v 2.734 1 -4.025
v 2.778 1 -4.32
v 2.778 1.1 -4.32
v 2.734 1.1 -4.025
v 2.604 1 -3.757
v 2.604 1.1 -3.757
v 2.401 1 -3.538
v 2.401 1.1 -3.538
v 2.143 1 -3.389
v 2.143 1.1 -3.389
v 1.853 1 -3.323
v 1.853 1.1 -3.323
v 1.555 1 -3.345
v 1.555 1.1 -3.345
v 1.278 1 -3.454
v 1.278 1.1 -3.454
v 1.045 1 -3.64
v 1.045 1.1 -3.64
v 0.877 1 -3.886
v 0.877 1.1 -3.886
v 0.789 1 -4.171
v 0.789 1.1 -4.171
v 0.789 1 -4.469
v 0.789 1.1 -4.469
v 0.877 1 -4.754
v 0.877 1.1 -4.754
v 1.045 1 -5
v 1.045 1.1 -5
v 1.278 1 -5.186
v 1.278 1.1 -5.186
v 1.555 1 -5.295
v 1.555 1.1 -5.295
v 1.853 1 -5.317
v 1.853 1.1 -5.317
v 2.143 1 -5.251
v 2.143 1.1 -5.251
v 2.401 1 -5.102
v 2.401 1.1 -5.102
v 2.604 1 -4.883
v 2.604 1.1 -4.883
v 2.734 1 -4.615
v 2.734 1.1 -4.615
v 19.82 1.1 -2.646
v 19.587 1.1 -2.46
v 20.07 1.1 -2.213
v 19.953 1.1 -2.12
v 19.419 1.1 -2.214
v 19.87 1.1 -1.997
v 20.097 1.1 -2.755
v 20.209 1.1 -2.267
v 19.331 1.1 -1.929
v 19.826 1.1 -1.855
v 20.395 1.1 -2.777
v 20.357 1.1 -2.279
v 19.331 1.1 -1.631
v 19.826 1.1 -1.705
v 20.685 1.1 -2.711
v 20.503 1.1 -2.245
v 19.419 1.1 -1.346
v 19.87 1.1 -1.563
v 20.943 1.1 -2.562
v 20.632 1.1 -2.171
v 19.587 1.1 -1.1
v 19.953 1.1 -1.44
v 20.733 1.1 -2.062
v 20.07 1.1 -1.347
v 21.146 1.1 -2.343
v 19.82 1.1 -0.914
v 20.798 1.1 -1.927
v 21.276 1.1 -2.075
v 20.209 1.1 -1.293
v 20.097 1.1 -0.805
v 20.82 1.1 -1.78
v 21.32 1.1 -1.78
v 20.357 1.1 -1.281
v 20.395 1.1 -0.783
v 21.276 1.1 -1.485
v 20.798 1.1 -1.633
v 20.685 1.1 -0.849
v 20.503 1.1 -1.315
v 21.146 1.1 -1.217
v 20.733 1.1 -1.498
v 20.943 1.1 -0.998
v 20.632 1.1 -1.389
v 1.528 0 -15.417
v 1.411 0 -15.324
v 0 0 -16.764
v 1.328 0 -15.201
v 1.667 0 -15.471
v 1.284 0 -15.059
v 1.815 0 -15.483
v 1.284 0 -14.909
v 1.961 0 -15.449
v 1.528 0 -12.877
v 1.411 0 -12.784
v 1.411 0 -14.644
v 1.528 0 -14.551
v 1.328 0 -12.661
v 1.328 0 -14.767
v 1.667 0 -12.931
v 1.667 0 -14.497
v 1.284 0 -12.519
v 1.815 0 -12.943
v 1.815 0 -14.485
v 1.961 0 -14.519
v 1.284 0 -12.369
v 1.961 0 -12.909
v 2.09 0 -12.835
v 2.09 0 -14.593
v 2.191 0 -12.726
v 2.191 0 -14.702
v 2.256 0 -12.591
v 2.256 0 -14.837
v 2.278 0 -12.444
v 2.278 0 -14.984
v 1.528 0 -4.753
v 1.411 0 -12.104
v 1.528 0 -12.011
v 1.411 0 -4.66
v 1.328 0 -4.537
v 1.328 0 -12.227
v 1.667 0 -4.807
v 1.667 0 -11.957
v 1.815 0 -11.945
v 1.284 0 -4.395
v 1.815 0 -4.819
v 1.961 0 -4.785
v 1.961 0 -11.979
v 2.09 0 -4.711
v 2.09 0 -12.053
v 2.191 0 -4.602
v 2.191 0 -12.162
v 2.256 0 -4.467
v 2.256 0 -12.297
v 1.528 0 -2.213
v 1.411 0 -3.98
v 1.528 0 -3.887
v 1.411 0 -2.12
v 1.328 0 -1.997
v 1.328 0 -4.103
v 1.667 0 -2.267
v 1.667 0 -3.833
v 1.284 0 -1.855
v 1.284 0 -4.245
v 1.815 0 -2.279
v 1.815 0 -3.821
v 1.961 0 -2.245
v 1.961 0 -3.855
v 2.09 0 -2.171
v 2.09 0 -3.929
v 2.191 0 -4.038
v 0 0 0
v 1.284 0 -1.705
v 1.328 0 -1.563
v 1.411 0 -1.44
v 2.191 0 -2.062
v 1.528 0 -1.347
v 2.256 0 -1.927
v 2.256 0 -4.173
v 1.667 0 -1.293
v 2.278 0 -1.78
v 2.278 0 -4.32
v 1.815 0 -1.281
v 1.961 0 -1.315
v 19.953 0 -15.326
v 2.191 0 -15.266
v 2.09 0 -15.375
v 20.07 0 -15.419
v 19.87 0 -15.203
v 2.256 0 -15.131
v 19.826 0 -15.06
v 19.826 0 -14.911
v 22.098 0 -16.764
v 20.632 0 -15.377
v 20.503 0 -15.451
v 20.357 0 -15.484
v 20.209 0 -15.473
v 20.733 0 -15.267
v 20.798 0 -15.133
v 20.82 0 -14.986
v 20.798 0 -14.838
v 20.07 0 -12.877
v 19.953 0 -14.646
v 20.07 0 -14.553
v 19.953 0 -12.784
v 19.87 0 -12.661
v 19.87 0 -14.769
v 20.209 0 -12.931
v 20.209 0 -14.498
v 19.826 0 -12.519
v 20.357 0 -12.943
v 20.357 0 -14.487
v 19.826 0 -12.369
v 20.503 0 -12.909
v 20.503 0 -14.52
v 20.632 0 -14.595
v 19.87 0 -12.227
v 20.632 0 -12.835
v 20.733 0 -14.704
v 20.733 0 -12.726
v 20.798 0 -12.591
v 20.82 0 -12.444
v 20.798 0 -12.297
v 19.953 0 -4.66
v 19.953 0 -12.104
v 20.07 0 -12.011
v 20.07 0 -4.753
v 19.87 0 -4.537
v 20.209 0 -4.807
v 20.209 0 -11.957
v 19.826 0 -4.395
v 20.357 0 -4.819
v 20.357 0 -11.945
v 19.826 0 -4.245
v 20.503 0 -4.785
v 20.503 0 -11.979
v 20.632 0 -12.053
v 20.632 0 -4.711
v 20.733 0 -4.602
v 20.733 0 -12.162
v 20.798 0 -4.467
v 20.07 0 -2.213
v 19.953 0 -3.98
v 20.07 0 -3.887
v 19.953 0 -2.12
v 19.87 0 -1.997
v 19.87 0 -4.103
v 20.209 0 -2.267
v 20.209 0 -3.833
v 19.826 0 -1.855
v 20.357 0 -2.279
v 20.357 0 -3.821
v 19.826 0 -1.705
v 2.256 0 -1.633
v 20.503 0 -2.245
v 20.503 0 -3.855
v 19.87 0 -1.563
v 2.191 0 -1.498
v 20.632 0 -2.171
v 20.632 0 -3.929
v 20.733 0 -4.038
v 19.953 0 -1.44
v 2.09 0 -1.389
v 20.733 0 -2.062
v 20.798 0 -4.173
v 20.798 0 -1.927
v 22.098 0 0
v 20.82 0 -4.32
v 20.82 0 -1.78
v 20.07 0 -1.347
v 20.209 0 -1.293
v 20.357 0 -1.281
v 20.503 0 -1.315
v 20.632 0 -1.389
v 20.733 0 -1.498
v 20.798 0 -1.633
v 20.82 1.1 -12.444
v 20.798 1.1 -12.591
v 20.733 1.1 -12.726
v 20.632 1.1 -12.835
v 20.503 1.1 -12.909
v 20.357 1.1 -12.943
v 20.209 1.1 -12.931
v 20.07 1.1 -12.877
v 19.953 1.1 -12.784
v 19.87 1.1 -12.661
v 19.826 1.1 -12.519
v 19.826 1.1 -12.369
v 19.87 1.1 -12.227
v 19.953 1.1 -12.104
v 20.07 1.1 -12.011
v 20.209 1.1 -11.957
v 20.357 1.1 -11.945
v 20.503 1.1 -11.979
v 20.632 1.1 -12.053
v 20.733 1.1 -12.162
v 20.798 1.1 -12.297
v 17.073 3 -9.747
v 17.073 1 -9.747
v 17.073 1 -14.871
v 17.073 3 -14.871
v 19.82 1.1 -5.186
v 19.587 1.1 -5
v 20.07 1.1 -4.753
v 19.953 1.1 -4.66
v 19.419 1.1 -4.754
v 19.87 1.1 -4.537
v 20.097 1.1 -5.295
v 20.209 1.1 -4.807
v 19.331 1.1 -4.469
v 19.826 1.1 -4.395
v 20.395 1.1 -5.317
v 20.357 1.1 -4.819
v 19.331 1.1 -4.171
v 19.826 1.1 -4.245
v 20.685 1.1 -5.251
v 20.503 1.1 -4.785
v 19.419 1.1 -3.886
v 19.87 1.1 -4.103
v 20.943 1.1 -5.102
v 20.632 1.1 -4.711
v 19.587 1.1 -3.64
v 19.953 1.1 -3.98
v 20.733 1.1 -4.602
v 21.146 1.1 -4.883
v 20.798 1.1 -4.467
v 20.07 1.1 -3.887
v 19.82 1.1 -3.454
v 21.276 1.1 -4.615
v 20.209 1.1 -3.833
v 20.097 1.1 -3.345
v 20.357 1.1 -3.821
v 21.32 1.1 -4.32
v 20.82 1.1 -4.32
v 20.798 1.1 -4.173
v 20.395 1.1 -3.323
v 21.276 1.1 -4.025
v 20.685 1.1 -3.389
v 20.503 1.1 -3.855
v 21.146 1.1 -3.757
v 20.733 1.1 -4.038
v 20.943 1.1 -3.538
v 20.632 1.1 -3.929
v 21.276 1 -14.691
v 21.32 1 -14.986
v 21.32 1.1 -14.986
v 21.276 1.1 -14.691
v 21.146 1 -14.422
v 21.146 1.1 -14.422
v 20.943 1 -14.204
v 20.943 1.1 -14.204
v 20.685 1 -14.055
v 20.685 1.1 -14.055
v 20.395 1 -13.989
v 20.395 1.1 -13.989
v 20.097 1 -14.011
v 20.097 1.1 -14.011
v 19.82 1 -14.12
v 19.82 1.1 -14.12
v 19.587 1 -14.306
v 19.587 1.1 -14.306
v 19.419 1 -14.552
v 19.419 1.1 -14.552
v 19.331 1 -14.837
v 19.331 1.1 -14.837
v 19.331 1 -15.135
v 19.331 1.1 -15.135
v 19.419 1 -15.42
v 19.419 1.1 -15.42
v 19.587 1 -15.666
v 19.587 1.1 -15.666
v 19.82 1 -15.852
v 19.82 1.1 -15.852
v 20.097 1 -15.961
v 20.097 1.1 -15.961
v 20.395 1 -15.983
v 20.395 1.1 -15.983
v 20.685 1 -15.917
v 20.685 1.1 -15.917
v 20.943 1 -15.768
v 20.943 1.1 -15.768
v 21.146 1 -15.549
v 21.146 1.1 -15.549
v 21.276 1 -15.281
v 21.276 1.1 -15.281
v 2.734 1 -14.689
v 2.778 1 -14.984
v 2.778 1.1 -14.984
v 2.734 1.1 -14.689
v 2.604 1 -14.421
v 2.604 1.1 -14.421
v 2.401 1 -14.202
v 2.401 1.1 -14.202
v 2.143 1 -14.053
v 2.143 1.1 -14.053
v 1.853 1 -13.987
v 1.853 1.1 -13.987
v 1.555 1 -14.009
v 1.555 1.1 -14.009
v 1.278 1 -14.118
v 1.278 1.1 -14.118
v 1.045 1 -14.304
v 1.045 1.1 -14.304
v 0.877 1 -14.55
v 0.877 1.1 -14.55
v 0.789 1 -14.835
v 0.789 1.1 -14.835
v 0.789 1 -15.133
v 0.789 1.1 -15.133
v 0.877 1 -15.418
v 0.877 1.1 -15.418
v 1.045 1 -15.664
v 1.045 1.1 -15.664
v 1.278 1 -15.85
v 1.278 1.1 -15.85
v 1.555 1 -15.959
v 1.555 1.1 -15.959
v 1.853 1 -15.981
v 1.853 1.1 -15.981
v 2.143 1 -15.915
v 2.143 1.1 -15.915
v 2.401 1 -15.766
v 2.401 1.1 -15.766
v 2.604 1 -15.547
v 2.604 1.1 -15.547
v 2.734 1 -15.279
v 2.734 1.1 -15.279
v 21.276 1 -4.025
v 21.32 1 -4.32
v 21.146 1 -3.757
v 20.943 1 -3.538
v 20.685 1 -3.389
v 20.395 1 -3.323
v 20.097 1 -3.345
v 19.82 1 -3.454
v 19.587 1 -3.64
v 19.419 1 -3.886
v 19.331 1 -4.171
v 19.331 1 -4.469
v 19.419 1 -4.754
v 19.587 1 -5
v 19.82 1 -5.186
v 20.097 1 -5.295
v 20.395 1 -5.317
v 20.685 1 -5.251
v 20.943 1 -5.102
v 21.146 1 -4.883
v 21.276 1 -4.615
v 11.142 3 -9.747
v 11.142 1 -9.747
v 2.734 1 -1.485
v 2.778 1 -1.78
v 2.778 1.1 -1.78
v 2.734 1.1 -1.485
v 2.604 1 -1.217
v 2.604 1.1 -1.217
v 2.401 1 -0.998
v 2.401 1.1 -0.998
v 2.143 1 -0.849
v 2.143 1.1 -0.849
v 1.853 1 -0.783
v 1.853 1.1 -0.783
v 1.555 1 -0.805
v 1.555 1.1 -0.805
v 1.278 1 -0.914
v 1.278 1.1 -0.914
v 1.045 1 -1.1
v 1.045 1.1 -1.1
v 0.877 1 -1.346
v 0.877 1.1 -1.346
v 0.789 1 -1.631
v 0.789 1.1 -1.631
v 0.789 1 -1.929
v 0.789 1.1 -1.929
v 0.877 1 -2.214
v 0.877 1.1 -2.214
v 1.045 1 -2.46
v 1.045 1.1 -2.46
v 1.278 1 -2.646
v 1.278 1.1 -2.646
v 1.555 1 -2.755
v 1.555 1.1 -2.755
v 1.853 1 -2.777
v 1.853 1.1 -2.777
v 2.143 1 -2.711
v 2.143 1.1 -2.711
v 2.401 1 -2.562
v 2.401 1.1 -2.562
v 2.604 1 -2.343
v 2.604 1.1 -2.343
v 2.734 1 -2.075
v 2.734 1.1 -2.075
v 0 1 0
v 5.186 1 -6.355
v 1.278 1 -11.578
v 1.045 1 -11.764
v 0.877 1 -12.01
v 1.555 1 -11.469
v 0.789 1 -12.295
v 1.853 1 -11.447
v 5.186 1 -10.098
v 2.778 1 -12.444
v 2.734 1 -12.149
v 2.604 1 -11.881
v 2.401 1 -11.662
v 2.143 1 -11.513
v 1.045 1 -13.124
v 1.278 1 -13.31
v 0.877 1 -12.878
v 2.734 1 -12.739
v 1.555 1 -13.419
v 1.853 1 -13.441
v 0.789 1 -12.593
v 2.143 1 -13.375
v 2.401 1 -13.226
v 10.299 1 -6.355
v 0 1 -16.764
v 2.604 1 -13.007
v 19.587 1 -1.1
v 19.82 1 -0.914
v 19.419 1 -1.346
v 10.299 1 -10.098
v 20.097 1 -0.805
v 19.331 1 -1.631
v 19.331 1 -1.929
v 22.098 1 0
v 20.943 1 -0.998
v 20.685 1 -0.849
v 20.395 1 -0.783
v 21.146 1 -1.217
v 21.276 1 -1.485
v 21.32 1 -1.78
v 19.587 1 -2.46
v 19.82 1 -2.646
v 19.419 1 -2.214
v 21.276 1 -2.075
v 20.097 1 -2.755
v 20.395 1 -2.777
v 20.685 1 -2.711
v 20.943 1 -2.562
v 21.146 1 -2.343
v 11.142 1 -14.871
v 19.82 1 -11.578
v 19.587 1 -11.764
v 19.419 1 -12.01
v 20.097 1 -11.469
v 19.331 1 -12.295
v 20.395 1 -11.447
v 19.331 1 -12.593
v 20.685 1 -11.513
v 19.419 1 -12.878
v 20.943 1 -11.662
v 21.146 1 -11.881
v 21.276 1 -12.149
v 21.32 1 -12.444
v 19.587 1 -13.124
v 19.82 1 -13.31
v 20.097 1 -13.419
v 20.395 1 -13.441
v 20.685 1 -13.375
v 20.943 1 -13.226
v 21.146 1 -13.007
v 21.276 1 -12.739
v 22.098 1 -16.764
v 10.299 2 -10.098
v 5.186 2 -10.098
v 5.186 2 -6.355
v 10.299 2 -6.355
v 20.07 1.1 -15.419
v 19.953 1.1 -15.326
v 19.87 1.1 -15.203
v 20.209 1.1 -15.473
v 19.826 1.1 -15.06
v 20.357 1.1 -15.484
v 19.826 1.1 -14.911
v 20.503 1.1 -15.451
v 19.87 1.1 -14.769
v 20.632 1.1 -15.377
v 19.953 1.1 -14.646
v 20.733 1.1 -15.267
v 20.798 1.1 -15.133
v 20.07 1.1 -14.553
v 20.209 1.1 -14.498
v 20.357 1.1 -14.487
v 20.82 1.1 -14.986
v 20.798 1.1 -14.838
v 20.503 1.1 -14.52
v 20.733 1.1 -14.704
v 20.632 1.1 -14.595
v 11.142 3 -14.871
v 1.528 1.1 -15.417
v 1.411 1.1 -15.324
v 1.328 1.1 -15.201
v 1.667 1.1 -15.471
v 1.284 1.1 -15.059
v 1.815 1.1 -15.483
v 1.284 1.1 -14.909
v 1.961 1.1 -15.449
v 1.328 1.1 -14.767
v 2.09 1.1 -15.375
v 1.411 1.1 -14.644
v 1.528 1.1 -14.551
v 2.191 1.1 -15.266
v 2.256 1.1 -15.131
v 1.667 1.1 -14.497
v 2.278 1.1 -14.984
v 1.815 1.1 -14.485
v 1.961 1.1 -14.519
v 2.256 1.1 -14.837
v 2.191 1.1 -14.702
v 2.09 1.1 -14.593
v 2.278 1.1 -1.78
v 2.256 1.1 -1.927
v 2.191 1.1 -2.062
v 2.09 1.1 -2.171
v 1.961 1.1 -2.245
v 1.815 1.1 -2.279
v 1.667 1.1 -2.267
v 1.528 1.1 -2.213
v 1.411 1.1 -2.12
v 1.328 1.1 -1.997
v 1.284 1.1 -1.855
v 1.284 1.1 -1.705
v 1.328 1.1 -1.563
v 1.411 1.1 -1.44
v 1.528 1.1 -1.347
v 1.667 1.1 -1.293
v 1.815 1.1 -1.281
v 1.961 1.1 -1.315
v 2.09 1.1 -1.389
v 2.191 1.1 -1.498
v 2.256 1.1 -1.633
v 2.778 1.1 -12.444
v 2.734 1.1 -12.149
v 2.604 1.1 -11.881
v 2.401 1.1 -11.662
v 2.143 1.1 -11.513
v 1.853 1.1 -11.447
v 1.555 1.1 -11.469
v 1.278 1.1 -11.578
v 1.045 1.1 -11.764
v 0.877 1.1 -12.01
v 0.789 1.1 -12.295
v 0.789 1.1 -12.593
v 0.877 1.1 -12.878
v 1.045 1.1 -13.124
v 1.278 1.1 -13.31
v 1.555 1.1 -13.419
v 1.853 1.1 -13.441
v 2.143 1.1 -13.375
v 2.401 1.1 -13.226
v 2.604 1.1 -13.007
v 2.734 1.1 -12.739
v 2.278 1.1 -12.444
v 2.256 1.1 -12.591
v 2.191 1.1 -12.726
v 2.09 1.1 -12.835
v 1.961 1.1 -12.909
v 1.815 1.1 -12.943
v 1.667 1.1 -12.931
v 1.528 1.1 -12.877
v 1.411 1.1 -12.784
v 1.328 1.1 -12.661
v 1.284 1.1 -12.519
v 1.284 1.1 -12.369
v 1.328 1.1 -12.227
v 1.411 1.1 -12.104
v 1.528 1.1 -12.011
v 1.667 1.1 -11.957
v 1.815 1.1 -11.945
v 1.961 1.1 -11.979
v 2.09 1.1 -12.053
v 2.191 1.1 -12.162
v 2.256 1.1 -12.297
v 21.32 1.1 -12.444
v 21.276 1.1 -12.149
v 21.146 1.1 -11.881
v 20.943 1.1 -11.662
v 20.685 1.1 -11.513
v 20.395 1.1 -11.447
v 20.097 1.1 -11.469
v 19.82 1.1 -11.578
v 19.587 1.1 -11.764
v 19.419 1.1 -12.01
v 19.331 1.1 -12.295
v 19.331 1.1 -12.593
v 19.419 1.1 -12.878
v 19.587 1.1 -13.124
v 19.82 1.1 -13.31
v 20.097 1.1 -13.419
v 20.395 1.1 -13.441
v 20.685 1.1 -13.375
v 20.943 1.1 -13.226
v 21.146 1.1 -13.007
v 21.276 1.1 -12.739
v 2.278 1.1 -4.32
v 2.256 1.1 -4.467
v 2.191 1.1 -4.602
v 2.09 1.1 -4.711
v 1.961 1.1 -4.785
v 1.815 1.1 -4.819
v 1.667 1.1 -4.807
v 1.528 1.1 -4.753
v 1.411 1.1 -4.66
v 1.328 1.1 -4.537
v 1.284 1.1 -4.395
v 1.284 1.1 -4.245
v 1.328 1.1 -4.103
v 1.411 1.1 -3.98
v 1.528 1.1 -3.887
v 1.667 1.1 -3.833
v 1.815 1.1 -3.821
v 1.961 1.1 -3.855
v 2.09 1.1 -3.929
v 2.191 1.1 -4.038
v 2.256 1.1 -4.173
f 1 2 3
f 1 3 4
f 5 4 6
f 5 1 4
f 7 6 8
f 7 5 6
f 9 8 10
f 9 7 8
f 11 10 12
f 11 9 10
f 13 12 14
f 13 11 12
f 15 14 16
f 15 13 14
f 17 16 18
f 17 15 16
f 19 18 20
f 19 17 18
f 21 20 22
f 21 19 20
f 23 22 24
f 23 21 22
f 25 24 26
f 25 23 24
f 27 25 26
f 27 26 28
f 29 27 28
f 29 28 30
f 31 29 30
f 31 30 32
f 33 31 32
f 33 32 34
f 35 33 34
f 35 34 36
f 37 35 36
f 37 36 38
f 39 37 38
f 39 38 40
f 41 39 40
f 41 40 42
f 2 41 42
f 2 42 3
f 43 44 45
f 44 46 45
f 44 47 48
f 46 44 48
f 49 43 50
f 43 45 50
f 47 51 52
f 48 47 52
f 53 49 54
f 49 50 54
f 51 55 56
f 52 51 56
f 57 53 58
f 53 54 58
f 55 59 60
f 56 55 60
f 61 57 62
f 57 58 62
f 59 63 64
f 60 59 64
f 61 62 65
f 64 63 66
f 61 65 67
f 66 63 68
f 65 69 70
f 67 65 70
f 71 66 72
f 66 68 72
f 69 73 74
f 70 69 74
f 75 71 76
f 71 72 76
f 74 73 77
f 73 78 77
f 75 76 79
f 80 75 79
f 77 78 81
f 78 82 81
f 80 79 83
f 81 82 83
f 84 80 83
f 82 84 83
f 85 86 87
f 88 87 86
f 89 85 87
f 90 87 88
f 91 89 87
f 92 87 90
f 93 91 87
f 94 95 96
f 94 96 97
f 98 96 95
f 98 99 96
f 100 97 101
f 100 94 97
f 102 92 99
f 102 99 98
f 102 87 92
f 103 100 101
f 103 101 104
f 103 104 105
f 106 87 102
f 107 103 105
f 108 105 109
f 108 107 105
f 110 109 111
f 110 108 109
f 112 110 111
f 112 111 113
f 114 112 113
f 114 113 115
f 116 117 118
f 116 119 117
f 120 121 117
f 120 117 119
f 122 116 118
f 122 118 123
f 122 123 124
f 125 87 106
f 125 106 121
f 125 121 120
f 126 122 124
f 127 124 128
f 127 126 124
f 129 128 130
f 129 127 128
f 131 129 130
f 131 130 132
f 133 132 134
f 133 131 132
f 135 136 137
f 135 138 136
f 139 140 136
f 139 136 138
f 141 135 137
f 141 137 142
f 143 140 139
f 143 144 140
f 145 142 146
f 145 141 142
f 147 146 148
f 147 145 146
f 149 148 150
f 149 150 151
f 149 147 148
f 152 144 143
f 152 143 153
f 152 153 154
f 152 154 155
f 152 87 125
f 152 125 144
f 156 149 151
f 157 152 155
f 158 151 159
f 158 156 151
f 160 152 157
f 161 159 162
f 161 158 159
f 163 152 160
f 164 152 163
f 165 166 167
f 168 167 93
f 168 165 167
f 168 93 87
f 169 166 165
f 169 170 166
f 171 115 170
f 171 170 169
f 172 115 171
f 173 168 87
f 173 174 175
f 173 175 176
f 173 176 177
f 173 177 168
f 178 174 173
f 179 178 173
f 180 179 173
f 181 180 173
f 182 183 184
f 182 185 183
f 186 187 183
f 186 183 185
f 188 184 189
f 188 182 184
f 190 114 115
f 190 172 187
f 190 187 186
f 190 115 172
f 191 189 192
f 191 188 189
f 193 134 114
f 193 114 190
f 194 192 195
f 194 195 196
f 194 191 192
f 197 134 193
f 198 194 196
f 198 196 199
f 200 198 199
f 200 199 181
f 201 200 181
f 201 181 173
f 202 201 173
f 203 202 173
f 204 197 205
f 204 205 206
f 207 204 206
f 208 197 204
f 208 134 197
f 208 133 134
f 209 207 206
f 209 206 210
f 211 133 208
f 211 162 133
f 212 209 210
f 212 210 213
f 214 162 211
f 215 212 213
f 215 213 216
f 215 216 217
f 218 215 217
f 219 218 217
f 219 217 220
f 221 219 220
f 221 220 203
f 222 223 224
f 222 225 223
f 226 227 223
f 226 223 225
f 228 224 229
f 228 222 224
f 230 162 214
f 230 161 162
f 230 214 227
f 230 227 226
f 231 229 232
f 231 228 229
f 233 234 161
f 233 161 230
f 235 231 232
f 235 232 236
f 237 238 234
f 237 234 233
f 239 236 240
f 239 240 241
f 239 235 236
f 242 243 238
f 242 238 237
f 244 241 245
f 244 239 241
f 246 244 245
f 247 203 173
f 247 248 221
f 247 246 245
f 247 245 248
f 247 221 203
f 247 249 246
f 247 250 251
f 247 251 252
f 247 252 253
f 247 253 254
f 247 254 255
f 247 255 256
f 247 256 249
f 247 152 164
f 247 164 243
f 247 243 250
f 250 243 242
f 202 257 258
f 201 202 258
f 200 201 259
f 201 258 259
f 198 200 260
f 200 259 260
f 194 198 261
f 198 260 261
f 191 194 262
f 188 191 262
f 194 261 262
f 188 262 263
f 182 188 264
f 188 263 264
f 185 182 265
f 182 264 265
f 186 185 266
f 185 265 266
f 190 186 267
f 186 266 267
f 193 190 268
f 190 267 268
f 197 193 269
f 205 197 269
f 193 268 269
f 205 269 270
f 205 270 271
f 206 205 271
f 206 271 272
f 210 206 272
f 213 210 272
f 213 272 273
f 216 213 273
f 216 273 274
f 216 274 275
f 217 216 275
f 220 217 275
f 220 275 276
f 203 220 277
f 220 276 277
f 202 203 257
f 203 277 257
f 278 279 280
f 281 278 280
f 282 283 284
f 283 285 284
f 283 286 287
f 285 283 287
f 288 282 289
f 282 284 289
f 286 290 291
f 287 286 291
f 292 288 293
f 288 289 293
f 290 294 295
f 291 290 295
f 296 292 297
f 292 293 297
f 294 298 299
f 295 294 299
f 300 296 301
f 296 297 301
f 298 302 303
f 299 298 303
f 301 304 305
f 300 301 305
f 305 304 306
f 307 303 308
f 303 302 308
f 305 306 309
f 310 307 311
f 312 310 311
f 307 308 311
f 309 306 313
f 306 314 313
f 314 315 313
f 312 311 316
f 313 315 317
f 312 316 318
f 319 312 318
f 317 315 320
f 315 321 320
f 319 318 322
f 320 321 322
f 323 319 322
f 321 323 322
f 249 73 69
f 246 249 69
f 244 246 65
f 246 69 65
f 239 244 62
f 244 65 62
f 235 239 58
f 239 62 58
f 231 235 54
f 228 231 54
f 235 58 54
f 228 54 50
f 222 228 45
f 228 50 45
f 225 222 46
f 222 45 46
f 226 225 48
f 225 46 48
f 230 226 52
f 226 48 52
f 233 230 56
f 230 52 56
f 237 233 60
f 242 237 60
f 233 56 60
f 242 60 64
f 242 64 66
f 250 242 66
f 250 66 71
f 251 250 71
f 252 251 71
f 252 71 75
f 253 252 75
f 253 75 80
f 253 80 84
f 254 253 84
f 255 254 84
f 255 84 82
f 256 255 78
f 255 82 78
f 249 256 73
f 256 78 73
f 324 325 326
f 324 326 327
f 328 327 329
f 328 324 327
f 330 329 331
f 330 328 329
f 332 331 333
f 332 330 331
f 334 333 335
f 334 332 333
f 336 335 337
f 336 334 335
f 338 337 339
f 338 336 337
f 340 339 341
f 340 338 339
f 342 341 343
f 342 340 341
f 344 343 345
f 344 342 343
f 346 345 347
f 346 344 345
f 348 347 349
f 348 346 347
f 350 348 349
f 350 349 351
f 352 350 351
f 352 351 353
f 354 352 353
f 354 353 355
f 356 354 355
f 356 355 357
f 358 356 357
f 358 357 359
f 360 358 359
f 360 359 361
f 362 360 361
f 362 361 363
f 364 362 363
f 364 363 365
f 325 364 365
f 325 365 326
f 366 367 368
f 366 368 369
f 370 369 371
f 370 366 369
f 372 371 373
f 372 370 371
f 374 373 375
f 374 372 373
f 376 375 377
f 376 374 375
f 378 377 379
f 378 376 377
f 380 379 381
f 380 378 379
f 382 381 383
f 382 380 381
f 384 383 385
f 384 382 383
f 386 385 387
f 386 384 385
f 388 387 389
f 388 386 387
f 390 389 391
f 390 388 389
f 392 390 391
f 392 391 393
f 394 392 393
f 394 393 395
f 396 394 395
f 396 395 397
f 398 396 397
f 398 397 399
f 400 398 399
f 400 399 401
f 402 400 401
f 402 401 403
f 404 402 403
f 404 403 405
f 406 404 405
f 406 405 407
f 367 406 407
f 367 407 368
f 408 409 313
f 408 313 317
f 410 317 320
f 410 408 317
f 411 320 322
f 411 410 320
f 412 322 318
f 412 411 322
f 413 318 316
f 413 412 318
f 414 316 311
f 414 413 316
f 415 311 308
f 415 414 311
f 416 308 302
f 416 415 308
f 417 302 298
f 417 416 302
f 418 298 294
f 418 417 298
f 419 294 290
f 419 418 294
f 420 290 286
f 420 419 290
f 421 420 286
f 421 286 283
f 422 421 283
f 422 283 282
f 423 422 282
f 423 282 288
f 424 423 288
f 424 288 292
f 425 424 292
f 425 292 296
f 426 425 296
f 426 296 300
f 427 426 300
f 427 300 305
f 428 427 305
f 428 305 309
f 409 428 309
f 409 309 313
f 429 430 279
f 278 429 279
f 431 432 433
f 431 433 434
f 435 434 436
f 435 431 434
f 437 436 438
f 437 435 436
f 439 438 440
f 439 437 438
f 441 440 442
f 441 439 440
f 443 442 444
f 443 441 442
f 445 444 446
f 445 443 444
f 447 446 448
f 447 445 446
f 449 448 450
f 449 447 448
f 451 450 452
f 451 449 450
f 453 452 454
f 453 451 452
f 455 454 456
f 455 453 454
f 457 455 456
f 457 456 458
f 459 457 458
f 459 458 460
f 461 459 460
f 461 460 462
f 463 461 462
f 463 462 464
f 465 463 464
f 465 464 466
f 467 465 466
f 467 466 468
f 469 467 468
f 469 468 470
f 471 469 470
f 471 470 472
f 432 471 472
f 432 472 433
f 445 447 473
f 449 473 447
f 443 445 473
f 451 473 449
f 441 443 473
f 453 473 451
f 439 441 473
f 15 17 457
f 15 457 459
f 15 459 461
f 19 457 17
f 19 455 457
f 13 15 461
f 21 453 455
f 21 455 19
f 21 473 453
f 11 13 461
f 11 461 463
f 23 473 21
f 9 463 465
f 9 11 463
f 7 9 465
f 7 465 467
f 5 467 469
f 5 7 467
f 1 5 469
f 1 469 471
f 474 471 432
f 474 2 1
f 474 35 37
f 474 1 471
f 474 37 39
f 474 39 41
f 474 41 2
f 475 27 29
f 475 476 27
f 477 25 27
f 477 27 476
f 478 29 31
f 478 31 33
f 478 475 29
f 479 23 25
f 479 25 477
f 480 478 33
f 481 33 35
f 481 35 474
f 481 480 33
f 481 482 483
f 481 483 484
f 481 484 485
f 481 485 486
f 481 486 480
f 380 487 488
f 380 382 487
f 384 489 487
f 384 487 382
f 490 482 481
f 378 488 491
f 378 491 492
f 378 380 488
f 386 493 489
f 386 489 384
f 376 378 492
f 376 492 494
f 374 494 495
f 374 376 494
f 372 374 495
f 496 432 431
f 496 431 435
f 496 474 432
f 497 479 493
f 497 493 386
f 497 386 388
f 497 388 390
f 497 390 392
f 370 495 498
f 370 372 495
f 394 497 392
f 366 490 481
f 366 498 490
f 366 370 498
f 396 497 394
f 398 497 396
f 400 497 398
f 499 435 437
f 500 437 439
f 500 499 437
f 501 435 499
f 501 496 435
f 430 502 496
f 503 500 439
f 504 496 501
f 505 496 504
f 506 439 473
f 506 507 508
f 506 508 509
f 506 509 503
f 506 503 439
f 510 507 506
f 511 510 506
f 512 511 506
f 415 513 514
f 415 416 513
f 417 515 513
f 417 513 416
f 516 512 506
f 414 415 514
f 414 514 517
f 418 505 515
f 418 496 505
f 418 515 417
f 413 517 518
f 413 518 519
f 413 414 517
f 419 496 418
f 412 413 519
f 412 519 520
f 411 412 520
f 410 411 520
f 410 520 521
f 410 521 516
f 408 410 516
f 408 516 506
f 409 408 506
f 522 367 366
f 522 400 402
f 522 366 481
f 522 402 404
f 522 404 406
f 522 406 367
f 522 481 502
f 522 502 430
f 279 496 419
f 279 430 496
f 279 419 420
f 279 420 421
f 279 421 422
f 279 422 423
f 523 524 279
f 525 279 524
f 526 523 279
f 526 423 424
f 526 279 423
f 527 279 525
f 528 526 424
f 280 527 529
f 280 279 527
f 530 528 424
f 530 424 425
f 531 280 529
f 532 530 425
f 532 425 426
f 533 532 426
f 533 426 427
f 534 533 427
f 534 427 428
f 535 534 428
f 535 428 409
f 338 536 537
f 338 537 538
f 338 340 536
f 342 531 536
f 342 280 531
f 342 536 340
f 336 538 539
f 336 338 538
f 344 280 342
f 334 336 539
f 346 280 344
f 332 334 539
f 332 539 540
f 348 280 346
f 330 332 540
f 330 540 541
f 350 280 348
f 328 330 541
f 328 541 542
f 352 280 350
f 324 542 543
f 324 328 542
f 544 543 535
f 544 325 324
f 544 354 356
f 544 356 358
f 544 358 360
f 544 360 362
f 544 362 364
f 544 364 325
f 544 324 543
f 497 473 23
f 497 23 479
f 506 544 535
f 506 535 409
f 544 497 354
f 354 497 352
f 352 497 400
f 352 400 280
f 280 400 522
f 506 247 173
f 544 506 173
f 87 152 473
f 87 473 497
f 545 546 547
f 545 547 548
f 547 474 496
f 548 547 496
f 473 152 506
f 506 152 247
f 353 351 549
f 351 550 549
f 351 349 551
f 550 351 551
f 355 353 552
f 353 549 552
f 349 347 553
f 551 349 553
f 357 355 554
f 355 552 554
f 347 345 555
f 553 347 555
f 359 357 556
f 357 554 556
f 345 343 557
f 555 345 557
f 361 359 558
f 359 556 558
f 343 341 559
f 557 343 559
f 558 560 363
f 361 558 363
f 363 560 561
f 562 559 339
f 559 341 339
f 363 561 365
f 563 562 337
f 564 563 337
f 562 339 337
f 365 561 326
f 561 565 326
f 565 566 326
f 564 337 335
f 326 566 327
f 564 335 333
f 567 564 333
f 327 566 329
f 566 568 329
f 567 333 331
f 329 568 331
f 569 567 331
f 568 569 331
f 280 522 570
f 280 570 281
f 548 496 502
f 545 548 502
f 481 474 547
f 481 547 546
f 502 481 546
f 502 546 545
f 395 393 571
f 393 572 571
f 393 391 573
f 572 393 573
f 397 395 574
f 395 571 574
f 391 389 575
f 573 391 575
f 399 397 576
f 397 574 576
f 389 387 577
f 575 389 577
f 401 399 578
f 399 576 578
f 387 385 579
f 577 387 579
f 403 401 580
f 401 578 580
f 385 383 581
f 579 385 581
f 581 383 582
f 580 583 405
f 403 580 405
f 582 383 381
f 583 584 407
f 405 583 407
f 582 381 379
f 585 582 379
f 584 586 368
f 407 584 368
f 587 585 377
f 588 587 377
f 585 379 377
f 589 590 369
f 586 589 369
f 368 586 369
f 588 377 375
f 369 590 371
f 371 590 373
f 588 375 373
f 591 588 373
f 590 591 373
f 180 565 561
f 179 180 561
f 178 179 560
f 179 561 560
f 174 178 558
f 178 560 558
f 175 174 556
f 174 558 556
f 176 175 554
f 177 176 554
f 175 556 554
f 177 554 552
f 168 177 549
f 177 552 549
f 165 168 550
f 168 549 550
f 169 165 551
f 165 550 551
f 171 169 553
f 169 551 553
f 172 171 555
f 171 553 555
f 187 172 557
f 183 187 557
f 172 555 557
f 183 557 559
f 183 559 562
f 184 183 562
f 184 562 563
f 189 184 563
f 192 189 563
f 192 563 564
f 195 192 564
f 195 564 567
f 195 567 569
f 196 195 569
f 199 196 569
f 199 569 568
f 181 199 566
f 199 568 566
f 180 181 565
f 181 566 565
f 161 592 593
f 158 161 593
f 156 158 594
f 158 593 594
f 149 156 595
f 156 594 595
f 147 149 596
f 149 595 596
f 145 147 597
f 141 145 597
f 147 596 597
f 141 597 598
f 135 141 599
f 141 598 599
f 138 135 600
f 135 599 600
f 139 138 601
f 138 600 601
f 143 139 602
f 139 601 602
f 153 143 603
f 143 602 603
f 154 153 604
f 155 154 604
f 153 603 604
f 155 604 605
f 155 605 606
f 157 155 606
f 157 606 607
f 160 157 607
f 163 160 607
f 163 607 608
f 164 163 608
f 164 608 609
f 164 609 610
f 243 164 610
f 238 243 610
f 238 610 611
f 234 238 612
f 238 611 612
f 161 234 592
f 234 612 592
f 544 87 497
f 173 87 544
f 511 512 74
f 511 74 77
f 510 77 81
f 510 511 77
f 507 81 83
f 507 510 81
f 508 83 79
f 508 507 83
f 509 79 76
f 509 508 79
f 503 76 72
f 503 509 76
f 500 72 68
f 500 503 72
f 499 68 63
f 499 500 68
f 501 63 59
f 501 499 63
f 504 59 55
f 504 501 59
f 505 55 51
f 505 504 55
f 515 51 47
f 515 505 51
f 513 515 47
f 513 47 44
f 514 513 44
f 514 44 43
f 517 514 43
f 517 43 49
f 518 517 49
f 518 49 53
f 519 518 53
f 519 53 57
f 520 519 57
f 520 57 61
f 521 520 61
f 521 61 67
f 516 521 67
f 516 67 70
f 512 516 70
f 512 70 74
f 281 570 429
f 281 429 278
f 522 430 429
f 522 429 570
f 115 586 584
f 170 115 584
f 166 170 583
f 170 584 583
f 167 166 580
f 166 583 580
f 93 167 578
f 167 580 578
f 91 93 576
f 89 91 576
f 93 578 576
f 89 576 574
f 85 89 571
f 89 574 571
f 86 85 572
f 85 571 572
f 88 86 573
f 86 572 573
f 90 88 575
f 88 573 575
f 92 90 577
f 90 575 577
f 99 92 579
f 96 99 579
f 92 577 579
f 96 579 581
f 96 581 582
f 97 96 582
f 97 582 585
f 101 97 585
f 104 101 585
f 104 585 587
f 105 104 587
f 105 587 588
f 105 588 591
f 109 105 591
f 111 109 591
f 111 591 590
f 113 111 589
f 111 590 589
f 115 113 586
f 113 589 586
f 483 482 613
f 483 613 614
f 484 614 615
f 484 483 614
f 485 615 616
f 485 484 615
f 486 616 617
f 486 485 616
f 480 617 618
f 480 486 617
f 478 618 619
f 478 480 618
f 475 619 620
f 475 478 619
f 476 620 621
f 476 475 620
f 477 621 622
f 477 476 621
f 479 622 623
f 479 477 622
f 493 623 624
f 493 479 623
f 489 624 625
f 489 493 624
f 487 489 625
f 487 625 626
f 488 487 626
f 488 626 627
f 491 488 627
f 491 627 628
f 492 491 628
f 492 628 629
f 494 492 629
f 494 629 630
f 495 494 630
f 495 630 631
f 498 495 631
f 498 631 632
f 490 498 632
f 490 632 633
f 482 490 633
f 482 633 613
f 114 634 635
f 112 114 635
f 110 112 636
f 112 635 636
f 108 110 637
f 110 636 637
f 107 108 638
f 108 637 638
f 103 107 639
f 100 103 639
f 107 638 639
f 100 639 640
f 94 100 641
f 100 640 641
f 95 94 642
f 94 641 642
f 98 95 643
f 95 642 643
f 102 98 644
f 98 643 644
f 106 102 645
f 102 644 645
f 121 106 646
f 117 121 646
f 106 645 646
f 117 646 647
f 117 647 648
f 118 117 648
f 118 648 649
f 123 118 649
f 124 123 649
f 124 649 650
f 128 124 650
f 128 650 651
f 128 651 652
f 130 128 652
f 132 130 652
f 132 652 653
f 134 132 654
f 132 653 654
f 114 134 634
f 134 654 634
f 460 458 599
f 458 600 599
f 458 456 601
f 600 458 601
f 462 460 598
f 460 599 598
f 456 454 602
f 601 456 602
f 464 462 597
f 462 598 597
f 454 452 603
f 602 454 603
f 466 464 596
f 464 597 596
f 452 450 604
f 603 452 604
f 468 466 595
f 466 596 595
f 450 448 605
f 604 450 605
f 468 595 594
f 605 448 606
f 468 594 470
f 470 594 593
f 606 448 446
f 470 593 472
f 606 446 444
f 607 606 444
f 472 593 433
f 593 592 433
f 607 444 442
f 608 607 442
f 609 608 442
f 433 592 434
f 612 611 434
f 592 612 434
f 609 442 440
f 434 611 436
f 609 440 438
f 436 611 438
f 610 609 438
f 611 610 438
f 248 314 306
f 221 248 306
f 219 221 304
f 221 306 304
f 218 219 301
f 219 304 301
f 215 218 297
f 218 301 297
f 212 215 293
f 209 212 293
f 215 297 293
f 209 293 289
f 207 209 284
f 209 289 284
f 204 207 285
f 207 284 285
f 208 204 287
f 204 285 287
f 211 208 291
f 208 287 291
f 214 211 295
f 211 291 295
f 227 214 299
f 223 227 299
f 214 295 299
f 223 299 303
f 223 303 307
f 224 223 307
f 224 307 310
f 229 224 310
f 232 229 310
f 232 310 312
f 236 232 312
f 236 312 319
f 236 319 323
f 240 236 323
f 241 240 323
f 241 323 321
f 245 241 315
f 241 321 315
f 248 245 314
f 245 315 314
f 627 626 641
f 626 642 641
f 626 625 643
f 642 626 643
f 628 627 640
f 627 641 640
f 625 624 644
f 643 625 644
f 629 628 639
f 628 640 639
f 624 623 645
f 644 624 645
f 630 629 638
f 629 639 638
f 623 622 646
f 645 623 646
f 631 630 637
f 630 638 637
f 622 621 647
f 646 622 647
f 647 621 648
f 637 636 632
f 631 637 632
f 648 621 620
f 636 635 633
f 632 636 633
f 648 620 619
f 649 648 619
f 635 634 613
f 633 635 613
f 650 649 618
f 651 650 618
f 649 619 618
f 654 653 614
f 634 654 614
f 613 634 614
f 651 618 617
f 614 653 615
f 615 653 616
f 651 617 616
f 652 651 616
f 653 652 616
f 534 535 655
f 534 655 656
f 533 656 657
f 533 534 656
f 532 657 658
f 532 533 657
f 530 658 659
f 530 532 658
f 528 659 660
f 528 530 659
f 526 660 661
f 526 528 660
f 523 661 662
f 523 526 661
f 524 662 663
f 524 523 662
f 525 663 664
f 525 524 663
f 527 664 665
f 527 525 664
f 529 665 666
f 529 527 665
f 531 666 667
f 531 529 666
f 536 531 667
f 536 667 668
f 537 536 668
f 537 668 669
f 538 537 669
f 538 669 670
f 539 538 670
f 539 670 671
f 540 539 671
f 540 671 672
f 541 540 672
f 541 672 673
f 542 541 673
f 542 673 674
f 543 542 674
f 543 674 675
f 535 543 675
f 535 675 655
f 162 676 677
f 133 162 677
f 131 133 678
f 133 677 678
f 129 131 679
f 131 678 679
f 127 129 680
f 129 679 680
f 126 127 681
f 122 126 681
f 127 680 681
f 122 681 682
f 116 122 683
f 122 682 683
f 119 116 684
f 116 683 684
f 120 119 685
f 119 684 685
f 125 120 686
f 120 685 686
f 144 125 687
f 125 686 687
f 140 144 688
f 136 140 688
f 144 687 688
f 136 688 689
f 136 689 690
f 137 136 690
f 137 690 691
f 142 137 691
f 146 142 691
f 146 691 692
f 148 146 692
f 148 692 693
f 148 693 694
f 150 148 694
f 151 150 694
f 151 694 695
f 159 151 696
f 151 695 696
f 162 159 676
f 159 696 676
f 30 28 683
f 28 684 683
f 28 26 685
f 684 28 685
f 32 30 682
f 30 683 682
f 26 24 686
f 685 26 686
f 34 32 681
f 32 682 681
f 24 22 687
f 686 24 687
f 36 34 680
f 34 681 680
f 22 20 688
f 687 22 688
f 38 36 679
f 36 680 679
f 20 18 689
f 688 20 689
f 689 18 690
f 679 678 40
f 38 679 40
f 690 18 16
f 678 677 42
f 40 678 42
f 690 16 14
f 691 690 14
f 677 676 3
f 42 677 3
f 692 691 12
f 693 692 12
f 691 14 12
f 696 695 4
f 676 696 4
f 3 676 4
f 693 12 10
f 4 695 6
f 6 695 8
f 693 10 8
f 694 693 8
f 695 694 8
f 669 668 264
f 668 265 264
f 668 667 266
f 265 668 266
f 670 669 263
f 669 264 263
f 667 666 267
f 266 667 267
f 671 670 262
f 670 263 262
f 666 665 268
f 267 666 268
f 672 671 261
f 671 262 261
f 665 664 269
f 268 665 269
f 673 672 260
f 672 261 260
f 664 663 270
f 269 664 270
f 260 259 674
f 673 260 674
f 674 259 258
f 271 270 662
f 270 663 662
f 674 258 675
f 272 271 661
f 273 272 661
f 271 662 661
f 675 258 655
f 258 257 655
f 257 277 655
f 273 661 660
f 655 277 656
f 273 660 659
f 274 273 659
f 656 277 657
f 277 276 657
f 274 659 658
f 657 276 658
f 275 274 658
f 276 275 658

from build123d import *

# Parameters (mm, degrees)
SKETCH1_W           = 22.098
SKETCH1_H           = 16.764
BOSS_EXTRUDE1_DEPTH = 1
SKETCH2_R           = 1
BOSS_EXTRUDE2_DEPTH = 1.1
SKETCH4_R           = 0.5
CUT_EXTRUDE1_DEPTH  = 1.1
SKETCH5_W           = 5.931061502
SKETCH5_H           = 5.124055134
BOSS_EXTRUDE3_DEPTH = 2
SKETCH6_W           = 5.112840458
SKETCH6_H           = 3.742927716
BOSS_EXTRUDE4_DEPTH = 1


with BuildPart() as part:
    # Sketch1 → Boss-Extrude1 (new body)
    with BuildSketch(Plane(origin=(0, 0, 0), x_dir=(1, 0, 0), z_dir=(0, 1, 0))):
        with Locations((11.049, 8.382)):
            Rectangle(SKETCH1_W, SKETCH1_H)
    extrude(amount=BOSS_EXTRUDE1_DEPTH)

    # Sketch2 → Boss-Extrude2 (add)
    with BuildSketch(Plane.XZ):
        with Locations((1.778, -14.984)):
            Circle(SKETCH2_R)
        with Locations((20.32, -14.985792546)):
            Circle(SKETCH2_R)
        with Locations((1.778, -12.444)):
            Circle(SKETCH2_R)
        with Locations((20.32, -12.444)):
            Circle(SKETCH2_R)
        with Locations((1.778, -1.78)):
            Circle(SKETCH2_R)
        with Locations((1.778, -4.32)):
            Circle(SKETCH2_R)
        with Locations((20.32, -4.32)):
            Circle(SKETCH2_R)
        with Locations((20.32, -1.78)):
            Circle(SKETCH2_R)
    extrude(amount=-BOSS_EXTRUDE2_DEPTH)

    # Sketch4 → Cut-Extrude1 (cut)
    with BuildSketch(Plane(origin=(0, 1.1, 0), x_dir=(1, 0, 0), z_dir=(0, 1, 0))):
        with Locations((1.778, 14.984)):
            Circle(SKETCH4_R)
        with Locations((1.778, 12.444)):
            Circle(SKETCH4_R)
        with Locations((1.778, 4.32)):
            Circle(SKETCH4_R)
        with Locations((1.778, 1.78)):
            Circle(SKETCH4_R)
        with Locations((20.32, 14.985792546)):
            Circle(SKETCH4_R)
        with Locations((20.32, 12.444)):
            Circle(SKETCH4_R)
        with Locations((20.32, 4.32)):
            Circle(SKETCH4_R)
        with Locations((20.32, 1.78)):
            Circle(SKETCH4_R)
    extrude(amount=-CUT_EXTRUDE1_DEPTH, mode=Mode.SUBTRACT)

    # Sketch5 → Boss-Extrude3 (add)
    with BuildSketch(Plane(origin=(0, 1, 0), x_dir=(1, 0, 0), z_dir=(0, 1, 0))):
        with Locations((14.107616891, 12.30880124)):
            Rectangle(SKETCH5_W, SKETCH5_H)
    extrude(amount=BOSS_EXTRUDE3_DEPTH)

    # Sketch6 → Boss-Extrude4 (add)
    with BuildSketch(Plane(origin=(0, 1, 0), x_dir=(1, 0, 0), z_dir=(0, 1, 0))):
        with Locations((7.742395479, 8.226436285)):
            Rectangle(SKETCH6_W, SKETCH6_H)
    extrude(amount=BOSS_EXTRUDE4_DEPTH)


solid = part.part
